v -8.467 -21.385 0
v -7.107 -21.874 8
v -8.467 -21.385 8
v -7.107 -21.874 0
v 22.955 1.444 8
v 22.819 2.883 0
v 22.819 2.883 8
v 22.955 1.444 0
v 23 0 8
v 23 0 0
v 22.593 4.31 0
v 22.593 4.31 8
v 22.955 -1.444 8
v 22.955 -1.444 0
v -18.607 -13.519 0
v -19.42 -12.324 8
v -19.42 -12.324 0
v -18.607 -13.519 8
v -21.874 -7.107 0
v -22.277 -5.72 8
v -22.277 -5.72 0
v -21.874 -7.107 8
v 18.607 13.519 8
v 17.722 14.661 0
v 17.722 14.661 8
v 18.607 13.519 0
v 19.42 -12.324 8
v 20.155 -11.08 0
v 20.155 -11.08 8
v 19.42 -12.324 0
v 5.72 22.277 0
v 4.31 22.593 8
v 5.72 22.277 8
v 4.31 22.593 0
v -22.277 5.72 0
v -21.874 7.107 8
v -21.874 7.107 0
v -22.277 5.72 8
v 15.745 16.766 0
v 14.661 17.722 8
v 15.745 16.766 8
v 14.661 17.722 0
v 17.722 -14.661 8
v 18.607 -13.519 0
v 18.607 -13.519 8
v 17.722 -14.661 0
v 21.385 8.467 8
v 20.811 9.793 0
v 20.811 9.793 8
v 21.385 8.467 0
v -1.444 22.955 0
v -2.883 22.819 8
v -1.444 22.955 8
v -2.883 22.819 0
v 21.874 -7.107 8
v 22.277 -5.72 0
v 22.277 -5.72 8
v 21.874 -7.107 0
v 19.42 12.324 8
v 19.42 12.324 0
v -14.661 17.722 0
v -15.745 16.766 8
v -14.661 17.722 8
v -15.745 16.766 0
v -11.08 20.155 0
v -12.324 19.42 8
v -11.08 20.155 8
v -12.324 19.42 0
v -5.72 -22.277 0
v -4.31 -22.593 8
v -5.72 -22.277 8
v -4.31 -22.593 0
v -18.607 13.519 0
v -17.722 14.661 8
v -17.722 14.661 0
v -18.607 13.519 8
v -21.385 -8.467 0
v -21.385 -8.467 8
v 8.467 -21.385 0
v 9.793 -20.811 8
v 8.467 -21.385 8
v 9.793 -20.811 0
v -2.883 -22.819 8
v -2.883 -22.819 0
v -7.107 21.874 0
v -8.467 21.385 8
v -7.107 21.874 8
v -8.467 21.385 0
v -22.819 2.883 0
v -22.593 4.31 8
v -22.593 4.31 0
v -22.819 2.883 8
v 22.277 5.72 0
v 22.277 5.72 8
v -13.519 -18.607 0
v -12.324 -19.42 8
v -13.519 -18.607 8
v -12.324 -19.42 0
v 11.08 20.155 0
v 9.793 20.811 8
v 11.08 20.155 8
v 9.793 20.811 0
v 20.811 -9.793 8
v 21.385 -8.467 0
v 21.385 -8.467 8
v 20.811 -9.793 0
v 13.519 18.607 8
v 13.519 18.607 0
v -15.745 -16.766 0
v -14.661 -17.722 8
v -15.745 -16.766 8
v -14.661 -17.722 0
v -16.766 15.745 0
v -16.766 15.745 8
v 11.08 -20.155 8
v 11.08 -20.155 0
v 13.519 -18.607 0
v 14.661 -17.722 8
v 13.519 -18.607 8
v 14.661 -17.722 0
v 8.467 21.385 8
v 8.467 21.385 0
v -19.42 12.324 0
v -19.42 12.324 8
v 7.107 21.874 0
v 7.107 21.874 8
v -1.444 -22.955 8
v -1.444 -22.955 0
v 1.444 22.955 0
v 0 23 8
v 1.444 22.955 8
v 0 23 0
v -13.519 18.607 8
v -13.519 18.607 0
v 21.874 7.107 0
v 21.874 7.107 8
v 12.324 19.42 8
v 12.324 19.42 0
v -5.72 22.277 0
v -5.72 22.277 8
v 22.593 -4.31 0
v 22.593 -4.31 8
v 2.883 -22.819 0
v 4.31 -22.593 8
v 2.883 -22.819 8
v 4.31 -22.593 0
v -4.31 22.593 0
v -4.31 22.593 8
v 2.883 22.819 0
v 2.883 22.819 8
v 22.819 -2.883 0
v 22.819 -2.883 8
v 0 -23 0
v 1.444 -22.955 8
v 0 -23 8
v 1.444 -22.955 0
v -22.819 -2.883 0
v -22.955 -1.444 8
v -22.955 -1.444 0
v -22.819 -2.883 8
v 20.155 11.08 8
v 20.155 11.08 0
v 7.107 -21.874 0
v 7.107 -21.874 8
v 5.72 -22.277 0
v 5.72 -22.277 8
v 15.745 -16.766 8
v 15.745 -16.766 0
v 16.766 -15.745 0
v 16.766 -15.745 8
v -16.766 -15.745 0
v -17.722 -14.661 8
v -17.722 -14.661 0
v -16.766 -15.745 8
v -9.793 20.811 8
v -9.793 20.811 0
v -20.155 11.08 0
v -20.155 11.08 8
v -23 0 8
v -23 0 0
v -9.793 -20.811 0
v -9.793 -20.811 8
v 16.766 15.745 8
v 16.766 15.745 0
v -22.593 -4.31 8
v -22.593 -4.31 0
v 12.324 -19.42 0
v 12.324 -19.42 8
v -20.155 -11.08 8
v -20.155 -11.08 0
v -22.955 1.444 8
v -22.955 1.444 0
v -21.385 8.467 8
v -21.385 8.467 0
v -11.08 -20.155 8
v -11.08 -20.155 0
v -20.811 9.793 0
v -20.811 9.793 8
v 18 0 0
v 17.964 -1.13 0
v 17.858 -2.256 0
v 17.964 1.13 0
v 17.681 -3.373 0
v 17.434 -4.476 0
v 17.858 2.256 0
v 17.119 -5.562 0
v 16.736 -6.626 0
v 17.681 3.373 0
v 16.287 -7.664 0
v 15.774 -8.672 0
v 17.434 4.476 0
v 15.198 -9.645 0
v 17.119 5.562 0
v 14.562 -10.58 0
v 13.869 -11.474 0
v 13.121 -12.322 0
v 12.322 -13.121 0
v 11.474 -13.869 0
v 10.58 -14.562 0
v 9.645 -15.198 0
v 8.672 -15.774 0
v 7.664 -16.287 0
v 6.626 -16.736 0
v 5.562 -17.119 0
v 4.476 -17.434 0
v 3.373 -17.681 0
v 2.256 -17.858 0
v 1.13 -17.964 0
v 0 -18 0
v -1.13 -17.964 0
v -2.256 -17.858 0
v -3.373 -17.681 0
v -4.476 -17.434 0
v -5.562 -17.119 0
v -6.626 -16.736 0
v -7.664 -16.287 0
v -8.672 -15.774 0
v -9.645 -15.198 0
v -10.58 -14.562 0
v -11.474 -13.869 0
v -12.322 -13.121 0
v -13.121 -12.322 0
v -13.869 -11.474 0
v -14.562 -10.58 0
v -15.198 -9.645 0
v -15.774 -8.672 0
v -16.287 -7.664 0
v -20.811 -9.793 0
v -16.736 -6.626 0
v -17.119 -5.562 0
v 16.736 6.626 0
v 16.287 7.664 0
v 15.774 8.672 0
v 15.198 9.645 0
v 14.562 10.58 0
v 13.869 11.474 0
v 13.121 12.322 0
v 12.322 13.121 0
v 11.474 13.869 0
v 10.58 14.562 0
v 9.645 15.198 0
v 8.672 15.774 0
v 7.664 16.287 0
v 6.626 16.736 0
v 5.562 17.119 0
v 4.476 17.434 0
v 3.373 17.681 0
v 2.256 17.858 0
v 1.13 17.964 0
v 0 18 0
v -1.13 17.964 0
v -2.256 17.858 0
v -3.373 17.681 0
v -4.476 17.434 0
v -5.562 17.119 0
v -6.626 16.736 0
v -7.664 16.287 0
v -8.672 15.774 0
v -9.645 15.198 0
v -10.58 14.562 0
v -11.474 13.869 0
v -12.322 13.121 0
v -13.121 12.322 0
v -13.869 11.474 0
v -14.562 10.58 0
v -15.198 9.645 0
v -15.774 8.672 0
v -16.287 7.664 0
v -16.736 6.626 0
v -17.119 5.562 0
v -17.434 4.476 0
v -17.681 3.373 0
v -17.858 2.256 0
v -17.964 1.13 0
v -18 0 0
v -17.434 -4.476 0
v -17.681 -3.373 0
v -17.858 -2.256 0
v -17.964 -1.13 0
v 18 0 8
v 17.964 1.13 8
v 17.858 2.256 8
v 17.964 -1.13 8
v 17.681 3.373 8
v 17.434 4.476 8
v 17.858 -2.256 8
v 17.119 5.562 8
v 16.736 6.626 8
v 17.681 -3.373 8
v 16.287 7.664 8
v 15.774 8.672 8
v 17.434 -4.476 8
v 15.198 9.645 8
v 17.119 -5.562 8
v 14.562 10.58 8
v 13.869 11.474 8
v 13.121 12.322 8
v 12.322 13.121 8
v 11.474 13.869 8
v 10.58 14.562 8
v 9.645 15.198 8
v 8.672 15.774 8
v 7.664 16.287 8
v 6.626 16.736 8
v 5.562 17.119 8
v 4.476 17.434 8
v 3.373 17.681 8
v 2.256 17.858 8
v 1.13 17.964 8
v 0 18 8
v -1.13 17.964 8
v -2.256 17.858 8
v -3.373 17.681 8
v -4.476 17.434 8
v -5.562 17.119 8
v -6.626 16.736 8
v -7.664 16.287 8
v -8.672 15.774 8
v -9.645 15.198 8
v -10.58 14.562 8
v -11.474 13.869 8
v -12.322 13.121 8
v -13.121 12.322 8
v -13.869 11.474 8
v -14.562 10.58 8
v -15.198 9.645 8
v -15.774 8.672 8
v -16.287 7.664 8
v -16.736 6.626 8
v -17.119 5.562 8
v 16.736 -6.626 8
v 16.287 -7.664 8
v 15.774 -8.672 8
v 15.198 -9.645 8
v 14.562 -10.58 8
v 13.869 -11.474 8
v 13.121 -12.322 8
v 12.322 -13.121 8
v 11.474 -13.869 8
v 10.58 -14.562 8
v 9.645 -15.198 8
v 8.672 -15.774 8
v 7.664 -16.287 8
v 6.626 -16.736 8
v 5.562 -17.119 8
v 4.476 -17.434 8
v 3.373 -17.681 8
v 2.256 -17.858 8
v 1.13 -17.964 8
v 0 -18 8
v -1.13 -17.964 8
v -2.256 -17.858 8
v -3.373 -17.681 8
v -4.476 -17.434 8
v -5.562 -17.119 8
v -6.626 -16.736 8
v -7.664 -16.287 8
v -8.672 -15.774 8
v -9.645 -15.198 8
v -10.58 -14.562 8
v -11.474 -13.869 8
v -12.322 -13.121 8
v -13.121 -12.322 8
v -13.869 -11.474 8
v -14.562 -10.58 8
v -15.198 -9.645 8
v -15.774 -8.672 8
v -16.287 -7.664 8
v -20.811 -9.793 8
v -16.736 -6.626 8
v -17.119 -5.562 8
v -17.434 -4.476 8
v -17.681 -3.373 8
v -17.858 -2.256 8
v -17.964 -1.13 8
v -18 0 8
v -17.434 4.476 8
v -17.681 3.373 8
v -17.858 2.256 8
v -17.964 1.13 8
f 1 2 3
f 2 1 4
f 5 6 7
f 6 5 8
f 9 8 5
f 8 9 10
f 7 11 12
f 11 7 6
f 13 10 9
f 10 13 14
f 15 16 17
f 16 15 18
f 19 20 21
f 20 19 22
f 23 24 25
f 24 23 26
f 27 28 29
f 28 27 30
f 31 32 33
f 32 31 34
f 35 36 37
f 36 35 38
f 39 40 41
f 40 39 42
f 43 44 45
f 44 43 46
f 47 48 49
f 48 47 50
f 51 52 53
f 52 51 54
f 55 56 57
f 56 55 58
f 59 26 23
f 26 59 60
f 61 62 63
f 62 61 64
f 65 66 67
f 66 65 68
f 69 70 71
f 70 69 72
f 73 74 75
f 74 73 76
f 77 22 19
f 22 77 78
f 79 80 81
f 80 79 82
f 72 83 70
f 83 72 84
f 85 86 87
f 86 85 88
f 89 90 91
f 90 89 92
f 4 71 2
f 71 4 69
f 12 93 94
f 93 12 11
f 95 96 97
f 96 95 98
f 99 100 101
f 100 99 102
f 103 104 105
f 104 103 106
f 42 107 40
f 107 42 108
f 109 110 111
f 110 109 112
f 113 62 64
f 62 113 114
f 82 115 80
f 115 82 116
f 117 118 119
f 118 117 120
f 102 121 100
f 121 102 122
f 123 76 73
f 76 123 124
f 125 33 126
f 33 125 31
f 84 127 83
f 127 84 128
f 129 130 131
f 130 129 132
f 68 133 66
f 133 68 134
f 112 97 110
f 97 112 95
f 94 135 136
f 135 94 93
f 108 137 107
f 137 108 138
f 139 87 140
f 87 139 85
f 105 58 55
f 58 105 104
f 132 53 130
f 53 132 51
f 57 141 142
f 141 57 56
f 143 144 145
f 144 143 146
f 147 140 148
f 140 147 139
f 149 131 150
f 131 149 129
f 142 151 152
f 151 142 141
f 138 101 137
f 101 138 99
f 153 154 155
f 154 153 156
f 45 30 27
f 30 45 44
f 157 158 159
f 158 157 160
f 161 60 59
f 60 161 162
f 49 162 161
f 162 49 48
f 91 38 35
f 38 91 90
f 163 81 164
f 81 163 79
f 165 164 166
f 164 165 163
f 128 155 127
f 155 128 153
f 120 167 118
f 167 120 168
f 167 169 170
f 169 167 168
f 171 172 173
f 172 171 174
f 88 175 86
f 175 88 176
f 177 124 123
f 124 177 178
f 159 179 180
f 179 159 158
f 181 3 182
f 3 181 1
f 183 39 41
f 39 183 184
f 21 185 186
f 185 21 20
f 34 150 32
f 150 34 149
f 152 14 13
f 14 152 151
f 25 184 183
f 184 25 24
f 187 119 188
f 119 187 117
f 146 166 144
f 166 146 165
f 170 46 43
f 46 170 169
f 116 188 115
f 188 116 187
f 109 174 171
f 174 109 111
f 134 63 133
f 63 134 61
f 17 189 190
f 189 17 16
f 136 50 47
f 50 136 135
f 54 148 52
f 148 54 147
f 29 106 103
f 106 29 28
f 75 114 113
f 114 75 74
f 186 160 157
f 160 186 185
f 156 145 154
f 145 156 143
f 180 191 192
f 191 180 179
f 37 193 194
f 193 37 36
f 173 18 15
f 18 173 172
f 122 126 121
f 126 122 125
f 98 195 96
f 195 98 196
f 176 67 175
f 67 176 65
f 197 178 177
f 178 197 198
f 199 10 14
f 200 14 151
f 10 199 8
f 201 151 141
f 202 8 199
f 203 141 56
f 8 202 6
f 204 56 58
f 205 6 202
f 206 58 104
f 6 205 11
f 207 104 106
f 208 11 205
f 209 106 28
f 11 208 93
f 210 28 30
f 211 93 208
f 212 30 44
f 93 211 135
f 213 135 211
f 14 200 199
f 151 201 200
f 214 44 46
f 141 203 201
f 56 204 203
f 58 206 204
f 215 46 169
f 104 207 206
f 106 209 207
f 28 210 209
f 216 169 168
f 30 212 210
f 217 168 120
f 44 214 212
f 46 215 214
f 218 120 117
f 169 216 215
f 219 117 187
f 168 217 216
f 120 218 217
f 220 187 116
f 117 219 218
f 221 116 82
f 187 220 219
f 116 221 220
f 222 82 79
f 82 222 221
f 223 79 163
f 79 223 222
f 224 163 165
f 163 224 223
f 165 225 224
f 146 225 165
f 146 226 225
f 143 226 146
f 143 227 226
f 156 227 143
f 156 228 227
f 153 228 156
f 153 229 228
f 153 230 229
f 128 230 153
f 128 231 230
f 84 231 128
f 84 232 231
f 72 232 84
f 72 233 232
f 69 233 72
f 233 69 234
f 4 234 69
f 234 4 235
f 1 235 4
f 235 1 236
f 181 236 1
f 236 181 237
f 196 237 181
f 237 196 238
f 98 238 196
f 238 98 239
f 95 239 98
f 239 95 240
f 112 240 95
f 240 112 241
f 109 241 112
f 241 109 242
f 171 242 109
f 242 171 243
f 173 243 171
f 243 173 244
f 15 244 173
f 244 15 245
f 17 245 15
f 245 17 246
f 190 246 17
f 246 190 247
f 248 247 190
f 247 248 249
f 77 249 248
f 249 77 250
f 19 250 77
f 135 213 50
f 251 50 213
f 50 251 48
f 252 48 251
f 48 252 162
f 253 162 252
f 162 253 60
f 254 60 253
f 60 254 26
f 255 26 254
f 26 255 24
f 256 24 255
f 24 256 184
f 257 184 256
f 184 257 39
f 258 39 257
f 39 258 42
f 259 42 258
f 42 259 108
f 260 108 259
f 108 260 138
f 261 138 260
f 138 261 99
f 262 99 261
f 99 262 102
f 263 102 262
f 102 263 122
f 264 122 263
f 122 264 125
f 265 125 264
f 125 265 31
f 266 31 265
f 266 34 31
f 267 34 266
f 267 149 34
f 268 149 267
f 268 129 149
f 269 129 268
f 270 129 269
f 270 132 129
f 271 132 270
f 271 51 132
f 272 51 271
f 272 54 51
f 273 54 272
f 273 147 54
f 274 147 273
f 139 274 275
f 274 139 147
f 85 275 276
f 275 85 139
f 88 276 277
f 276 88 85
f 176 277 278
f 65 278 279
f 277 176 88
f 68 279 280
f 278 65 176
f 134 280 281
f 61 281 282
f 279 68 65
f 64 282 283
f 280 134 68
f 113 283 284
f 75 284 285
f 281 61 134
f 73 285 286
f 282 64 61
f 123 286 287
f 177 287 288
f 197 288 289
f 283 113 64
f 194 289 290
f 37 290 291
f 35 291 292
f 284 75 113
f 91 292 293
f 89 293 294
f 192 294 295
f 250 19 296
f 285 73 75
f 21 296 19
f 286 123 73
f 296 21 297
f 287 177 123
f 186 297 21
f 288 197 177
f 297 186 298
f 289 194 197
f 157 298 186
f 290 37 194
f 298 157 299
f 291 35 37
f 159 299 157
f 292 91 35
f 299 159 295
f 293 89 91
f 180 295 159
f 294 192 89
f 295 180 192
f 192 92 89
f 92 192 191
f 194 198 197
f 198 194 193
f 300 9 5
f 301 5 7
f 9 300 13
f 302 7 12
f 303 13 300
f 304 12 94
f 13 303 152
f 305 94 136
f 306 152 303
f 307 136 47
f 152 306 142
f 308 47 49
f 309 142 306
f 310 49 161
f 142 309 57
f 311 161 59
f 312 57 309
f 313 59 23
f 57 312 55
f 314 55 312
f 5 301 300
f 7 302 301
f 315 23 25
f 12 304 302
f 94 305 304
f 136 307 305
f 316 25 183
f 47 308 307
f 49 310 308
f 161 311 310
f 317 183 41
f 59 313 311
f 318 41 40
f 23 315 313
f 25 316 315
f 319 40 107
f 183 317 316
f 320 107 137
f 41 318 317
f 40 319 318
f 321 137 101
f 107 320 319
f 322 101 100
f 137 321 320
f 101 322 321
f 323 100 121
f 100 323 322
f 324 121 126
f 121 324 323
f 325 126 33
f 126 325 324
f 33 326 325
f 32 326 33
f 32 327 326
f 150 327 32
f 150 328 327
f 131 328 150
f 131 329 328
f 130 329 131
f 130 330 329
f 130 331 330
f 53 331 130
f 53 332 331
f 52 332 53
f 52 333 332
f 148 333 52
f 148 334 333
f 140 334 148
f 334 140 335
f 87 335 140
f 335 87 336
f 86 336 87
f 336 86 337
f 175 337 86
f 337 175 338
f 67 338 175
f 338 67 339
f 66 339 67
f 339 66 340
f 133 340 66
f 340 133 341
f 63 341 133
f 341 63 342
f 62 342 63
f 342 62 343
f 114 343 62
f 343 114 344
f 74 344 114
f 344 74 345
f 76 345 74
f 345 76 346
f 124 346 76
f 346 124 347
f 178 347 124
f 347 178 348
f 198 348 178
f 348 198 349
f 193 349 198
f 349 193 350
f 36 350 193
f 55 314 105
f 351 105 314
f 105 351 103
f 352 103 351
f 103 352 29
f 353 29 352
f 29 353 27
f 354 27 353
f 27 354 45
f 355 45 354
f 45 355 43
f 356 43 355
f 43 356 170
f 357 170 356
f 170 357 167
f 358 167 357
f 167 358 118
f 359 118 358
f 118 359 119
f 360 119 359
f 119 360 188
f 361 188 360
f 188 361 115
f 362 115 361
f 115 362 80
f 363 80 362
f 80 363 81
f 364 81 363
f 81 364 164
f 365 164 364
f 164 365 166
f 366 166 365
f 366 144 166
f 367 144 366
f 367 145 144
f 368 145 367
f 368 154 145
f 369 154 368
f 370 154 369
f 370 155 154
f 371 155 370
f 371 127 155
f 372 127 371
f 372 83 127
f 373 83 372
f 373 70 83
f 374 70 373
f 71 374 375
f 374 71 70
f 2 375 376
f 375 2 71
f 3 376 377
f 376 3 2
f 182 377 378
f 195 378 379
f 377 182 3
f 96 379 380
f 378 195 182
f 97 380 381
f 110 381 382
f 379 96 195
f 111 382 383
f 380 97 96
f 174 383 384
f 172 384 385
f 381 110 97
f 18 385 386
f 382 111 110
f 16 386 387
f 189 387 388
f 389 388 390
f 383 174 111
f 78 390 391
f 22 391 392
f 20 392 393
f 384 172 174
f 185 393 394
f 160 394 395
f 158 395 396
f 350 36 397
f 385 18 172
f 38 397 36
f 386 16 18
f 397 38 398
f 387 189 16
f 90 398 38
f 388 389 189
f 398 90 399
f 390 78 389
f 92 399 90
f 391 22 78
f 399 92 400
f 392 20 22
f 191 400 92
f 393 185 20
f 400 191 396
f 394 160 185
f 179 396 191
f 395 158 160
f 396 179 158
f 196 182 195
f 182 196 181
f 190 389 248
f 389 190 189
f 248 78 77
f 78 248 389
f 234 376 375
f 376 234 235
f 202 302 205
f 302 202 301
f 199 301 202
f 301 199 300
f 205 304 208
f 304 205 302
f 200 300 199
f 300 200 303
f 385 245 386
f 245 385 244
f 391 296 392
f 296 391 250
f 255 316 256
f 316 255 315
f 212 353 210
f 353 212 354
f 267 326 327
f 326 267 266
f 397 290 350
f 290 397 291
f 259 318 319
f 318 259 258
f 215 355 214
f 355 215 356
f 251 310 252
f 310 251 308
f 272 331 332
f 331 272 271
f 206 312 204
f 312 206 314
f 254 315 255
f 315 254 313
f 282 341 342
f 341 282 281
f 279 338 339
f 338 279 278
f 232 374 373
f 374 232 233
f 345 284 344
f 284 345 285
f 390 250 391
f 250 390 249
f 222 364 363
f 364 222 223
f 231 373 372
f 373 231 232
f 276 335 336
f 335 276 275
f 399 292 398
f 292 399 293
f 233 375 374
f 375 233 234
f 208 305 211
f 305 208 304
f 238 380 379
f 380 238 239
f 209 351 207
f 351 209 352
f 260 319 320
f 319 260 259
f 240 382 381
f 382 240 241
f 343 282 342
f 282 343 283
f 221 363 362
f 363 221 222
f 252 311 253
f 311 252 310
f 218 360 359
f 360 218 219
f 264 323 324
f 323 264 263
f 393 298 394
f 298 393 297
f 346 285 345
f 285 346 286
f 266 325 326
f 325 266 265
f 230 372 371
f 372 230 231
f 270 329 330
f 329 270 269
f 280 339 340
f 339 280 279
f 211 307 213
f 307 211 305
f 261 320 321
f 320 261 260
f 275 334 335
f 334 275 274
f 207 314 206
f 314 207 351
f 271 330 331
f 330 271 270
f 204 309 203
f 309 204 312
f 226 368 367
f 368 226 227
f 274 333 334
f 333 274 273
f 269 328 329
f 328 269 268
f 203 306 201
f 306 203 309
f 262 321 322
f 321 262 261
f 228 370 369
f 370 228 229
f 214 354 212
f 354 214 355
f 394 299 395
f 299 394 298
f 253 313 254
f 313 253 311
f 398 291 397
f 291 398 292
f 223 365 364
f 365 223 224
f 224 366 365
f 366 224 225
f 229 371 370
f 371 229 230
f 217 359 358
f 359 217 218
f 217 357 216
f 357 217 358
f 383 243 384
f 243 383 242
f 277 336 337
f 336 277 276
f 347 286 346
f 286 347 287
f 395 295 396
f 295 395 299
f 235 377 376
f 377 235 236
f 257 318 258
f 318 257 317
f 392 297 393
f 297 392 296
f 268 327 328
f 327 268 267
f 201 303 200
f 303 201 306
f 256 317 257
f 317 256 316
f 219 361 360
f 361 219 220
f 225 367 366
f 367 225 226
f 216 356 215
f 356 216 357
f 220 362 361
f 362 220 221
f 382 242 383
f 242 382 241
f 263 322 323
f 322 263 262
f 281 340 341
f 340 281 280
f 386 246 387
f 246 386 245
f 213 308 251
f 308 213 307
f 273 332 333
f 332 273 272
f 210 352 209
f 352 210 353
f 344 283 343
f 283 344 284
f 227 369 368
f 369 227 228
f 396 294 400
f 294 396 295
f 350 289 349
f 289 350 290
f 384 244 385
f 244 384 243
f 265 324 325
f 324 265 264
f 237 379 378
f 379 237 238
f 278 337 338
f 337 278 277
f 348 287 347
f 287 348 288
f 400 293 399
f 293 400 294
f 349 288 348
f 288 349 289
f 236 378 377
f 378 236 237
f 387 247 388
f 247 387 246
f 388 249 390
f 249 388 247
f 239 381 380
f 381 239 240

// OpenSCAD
$fn=100;
d1=36;
d2=22;
l=170;
t=5;
tz=7;
h=14;
open=1;


//tube_support();

washer();


module washer(){
    difference(){
        union(){
            cylinder(d=d1+t*2, h=8);
                
        }
        //--------------------------------
        translate([0,0,-.1])
        cylinder(d=d1, h=10);
    }
}    

module tube_support(){
    difference(){
        union(){
            hull(){
                cylinder(d=d1+t*2, h=tz);
                
                translate([l,0,0])
                cylinder(d=d2+t*2, h=tz); 
            }
            // reinforce
            cylinder(d=d1+t*2, h=h);
            hull(){
                translate([d1/2,0,0])
                cylinder(d=t*2, h=tz*2);
                
                translate([l/2,0,0])
                cylinder(d=t, h=tz); 
            }
        }
        //----------------------------
        if(open==1){
            translate([0,0,-.1])
            cylinder(d=d1, h=tz*3);
        }else{
            translate([0,0,-tz/2])
            cylinder(d=d1, h=tz*2);
        }
        translate([l,0,-.1])
        cylinder(d=d2, h=tz*2); 
        
        translate([l,-t,-.1])
        cube([d2,t*2,tz*2]);
    }
    
    // round end
    translate([l+d2/2+t/2-1,t, 0])
    cylinder(d=t+.5, h=tz*2); 
    translate([l+d2/2+t/2-1,-t, 0])
    cylinder(d=t+.5, h=tz*2); 
    
    difference(){
        hull(){
            cylinder(d=d1+t*2, h=tz*2);
            
            translate([l,0,0])
            cylinder(d=d2+t*2, h=tz*2); 
        }

        hull(){
            translate([0,0,-.1])
            cylinder(d=d1, h=tz*3);
            
            translate([l,0,-.1])
            cylinder(d=d2, h=tz*3); 
        }
        //cut
        translate([l,-t,-.1])
        cube([d2,t*2,tz*3]);
    }
}
